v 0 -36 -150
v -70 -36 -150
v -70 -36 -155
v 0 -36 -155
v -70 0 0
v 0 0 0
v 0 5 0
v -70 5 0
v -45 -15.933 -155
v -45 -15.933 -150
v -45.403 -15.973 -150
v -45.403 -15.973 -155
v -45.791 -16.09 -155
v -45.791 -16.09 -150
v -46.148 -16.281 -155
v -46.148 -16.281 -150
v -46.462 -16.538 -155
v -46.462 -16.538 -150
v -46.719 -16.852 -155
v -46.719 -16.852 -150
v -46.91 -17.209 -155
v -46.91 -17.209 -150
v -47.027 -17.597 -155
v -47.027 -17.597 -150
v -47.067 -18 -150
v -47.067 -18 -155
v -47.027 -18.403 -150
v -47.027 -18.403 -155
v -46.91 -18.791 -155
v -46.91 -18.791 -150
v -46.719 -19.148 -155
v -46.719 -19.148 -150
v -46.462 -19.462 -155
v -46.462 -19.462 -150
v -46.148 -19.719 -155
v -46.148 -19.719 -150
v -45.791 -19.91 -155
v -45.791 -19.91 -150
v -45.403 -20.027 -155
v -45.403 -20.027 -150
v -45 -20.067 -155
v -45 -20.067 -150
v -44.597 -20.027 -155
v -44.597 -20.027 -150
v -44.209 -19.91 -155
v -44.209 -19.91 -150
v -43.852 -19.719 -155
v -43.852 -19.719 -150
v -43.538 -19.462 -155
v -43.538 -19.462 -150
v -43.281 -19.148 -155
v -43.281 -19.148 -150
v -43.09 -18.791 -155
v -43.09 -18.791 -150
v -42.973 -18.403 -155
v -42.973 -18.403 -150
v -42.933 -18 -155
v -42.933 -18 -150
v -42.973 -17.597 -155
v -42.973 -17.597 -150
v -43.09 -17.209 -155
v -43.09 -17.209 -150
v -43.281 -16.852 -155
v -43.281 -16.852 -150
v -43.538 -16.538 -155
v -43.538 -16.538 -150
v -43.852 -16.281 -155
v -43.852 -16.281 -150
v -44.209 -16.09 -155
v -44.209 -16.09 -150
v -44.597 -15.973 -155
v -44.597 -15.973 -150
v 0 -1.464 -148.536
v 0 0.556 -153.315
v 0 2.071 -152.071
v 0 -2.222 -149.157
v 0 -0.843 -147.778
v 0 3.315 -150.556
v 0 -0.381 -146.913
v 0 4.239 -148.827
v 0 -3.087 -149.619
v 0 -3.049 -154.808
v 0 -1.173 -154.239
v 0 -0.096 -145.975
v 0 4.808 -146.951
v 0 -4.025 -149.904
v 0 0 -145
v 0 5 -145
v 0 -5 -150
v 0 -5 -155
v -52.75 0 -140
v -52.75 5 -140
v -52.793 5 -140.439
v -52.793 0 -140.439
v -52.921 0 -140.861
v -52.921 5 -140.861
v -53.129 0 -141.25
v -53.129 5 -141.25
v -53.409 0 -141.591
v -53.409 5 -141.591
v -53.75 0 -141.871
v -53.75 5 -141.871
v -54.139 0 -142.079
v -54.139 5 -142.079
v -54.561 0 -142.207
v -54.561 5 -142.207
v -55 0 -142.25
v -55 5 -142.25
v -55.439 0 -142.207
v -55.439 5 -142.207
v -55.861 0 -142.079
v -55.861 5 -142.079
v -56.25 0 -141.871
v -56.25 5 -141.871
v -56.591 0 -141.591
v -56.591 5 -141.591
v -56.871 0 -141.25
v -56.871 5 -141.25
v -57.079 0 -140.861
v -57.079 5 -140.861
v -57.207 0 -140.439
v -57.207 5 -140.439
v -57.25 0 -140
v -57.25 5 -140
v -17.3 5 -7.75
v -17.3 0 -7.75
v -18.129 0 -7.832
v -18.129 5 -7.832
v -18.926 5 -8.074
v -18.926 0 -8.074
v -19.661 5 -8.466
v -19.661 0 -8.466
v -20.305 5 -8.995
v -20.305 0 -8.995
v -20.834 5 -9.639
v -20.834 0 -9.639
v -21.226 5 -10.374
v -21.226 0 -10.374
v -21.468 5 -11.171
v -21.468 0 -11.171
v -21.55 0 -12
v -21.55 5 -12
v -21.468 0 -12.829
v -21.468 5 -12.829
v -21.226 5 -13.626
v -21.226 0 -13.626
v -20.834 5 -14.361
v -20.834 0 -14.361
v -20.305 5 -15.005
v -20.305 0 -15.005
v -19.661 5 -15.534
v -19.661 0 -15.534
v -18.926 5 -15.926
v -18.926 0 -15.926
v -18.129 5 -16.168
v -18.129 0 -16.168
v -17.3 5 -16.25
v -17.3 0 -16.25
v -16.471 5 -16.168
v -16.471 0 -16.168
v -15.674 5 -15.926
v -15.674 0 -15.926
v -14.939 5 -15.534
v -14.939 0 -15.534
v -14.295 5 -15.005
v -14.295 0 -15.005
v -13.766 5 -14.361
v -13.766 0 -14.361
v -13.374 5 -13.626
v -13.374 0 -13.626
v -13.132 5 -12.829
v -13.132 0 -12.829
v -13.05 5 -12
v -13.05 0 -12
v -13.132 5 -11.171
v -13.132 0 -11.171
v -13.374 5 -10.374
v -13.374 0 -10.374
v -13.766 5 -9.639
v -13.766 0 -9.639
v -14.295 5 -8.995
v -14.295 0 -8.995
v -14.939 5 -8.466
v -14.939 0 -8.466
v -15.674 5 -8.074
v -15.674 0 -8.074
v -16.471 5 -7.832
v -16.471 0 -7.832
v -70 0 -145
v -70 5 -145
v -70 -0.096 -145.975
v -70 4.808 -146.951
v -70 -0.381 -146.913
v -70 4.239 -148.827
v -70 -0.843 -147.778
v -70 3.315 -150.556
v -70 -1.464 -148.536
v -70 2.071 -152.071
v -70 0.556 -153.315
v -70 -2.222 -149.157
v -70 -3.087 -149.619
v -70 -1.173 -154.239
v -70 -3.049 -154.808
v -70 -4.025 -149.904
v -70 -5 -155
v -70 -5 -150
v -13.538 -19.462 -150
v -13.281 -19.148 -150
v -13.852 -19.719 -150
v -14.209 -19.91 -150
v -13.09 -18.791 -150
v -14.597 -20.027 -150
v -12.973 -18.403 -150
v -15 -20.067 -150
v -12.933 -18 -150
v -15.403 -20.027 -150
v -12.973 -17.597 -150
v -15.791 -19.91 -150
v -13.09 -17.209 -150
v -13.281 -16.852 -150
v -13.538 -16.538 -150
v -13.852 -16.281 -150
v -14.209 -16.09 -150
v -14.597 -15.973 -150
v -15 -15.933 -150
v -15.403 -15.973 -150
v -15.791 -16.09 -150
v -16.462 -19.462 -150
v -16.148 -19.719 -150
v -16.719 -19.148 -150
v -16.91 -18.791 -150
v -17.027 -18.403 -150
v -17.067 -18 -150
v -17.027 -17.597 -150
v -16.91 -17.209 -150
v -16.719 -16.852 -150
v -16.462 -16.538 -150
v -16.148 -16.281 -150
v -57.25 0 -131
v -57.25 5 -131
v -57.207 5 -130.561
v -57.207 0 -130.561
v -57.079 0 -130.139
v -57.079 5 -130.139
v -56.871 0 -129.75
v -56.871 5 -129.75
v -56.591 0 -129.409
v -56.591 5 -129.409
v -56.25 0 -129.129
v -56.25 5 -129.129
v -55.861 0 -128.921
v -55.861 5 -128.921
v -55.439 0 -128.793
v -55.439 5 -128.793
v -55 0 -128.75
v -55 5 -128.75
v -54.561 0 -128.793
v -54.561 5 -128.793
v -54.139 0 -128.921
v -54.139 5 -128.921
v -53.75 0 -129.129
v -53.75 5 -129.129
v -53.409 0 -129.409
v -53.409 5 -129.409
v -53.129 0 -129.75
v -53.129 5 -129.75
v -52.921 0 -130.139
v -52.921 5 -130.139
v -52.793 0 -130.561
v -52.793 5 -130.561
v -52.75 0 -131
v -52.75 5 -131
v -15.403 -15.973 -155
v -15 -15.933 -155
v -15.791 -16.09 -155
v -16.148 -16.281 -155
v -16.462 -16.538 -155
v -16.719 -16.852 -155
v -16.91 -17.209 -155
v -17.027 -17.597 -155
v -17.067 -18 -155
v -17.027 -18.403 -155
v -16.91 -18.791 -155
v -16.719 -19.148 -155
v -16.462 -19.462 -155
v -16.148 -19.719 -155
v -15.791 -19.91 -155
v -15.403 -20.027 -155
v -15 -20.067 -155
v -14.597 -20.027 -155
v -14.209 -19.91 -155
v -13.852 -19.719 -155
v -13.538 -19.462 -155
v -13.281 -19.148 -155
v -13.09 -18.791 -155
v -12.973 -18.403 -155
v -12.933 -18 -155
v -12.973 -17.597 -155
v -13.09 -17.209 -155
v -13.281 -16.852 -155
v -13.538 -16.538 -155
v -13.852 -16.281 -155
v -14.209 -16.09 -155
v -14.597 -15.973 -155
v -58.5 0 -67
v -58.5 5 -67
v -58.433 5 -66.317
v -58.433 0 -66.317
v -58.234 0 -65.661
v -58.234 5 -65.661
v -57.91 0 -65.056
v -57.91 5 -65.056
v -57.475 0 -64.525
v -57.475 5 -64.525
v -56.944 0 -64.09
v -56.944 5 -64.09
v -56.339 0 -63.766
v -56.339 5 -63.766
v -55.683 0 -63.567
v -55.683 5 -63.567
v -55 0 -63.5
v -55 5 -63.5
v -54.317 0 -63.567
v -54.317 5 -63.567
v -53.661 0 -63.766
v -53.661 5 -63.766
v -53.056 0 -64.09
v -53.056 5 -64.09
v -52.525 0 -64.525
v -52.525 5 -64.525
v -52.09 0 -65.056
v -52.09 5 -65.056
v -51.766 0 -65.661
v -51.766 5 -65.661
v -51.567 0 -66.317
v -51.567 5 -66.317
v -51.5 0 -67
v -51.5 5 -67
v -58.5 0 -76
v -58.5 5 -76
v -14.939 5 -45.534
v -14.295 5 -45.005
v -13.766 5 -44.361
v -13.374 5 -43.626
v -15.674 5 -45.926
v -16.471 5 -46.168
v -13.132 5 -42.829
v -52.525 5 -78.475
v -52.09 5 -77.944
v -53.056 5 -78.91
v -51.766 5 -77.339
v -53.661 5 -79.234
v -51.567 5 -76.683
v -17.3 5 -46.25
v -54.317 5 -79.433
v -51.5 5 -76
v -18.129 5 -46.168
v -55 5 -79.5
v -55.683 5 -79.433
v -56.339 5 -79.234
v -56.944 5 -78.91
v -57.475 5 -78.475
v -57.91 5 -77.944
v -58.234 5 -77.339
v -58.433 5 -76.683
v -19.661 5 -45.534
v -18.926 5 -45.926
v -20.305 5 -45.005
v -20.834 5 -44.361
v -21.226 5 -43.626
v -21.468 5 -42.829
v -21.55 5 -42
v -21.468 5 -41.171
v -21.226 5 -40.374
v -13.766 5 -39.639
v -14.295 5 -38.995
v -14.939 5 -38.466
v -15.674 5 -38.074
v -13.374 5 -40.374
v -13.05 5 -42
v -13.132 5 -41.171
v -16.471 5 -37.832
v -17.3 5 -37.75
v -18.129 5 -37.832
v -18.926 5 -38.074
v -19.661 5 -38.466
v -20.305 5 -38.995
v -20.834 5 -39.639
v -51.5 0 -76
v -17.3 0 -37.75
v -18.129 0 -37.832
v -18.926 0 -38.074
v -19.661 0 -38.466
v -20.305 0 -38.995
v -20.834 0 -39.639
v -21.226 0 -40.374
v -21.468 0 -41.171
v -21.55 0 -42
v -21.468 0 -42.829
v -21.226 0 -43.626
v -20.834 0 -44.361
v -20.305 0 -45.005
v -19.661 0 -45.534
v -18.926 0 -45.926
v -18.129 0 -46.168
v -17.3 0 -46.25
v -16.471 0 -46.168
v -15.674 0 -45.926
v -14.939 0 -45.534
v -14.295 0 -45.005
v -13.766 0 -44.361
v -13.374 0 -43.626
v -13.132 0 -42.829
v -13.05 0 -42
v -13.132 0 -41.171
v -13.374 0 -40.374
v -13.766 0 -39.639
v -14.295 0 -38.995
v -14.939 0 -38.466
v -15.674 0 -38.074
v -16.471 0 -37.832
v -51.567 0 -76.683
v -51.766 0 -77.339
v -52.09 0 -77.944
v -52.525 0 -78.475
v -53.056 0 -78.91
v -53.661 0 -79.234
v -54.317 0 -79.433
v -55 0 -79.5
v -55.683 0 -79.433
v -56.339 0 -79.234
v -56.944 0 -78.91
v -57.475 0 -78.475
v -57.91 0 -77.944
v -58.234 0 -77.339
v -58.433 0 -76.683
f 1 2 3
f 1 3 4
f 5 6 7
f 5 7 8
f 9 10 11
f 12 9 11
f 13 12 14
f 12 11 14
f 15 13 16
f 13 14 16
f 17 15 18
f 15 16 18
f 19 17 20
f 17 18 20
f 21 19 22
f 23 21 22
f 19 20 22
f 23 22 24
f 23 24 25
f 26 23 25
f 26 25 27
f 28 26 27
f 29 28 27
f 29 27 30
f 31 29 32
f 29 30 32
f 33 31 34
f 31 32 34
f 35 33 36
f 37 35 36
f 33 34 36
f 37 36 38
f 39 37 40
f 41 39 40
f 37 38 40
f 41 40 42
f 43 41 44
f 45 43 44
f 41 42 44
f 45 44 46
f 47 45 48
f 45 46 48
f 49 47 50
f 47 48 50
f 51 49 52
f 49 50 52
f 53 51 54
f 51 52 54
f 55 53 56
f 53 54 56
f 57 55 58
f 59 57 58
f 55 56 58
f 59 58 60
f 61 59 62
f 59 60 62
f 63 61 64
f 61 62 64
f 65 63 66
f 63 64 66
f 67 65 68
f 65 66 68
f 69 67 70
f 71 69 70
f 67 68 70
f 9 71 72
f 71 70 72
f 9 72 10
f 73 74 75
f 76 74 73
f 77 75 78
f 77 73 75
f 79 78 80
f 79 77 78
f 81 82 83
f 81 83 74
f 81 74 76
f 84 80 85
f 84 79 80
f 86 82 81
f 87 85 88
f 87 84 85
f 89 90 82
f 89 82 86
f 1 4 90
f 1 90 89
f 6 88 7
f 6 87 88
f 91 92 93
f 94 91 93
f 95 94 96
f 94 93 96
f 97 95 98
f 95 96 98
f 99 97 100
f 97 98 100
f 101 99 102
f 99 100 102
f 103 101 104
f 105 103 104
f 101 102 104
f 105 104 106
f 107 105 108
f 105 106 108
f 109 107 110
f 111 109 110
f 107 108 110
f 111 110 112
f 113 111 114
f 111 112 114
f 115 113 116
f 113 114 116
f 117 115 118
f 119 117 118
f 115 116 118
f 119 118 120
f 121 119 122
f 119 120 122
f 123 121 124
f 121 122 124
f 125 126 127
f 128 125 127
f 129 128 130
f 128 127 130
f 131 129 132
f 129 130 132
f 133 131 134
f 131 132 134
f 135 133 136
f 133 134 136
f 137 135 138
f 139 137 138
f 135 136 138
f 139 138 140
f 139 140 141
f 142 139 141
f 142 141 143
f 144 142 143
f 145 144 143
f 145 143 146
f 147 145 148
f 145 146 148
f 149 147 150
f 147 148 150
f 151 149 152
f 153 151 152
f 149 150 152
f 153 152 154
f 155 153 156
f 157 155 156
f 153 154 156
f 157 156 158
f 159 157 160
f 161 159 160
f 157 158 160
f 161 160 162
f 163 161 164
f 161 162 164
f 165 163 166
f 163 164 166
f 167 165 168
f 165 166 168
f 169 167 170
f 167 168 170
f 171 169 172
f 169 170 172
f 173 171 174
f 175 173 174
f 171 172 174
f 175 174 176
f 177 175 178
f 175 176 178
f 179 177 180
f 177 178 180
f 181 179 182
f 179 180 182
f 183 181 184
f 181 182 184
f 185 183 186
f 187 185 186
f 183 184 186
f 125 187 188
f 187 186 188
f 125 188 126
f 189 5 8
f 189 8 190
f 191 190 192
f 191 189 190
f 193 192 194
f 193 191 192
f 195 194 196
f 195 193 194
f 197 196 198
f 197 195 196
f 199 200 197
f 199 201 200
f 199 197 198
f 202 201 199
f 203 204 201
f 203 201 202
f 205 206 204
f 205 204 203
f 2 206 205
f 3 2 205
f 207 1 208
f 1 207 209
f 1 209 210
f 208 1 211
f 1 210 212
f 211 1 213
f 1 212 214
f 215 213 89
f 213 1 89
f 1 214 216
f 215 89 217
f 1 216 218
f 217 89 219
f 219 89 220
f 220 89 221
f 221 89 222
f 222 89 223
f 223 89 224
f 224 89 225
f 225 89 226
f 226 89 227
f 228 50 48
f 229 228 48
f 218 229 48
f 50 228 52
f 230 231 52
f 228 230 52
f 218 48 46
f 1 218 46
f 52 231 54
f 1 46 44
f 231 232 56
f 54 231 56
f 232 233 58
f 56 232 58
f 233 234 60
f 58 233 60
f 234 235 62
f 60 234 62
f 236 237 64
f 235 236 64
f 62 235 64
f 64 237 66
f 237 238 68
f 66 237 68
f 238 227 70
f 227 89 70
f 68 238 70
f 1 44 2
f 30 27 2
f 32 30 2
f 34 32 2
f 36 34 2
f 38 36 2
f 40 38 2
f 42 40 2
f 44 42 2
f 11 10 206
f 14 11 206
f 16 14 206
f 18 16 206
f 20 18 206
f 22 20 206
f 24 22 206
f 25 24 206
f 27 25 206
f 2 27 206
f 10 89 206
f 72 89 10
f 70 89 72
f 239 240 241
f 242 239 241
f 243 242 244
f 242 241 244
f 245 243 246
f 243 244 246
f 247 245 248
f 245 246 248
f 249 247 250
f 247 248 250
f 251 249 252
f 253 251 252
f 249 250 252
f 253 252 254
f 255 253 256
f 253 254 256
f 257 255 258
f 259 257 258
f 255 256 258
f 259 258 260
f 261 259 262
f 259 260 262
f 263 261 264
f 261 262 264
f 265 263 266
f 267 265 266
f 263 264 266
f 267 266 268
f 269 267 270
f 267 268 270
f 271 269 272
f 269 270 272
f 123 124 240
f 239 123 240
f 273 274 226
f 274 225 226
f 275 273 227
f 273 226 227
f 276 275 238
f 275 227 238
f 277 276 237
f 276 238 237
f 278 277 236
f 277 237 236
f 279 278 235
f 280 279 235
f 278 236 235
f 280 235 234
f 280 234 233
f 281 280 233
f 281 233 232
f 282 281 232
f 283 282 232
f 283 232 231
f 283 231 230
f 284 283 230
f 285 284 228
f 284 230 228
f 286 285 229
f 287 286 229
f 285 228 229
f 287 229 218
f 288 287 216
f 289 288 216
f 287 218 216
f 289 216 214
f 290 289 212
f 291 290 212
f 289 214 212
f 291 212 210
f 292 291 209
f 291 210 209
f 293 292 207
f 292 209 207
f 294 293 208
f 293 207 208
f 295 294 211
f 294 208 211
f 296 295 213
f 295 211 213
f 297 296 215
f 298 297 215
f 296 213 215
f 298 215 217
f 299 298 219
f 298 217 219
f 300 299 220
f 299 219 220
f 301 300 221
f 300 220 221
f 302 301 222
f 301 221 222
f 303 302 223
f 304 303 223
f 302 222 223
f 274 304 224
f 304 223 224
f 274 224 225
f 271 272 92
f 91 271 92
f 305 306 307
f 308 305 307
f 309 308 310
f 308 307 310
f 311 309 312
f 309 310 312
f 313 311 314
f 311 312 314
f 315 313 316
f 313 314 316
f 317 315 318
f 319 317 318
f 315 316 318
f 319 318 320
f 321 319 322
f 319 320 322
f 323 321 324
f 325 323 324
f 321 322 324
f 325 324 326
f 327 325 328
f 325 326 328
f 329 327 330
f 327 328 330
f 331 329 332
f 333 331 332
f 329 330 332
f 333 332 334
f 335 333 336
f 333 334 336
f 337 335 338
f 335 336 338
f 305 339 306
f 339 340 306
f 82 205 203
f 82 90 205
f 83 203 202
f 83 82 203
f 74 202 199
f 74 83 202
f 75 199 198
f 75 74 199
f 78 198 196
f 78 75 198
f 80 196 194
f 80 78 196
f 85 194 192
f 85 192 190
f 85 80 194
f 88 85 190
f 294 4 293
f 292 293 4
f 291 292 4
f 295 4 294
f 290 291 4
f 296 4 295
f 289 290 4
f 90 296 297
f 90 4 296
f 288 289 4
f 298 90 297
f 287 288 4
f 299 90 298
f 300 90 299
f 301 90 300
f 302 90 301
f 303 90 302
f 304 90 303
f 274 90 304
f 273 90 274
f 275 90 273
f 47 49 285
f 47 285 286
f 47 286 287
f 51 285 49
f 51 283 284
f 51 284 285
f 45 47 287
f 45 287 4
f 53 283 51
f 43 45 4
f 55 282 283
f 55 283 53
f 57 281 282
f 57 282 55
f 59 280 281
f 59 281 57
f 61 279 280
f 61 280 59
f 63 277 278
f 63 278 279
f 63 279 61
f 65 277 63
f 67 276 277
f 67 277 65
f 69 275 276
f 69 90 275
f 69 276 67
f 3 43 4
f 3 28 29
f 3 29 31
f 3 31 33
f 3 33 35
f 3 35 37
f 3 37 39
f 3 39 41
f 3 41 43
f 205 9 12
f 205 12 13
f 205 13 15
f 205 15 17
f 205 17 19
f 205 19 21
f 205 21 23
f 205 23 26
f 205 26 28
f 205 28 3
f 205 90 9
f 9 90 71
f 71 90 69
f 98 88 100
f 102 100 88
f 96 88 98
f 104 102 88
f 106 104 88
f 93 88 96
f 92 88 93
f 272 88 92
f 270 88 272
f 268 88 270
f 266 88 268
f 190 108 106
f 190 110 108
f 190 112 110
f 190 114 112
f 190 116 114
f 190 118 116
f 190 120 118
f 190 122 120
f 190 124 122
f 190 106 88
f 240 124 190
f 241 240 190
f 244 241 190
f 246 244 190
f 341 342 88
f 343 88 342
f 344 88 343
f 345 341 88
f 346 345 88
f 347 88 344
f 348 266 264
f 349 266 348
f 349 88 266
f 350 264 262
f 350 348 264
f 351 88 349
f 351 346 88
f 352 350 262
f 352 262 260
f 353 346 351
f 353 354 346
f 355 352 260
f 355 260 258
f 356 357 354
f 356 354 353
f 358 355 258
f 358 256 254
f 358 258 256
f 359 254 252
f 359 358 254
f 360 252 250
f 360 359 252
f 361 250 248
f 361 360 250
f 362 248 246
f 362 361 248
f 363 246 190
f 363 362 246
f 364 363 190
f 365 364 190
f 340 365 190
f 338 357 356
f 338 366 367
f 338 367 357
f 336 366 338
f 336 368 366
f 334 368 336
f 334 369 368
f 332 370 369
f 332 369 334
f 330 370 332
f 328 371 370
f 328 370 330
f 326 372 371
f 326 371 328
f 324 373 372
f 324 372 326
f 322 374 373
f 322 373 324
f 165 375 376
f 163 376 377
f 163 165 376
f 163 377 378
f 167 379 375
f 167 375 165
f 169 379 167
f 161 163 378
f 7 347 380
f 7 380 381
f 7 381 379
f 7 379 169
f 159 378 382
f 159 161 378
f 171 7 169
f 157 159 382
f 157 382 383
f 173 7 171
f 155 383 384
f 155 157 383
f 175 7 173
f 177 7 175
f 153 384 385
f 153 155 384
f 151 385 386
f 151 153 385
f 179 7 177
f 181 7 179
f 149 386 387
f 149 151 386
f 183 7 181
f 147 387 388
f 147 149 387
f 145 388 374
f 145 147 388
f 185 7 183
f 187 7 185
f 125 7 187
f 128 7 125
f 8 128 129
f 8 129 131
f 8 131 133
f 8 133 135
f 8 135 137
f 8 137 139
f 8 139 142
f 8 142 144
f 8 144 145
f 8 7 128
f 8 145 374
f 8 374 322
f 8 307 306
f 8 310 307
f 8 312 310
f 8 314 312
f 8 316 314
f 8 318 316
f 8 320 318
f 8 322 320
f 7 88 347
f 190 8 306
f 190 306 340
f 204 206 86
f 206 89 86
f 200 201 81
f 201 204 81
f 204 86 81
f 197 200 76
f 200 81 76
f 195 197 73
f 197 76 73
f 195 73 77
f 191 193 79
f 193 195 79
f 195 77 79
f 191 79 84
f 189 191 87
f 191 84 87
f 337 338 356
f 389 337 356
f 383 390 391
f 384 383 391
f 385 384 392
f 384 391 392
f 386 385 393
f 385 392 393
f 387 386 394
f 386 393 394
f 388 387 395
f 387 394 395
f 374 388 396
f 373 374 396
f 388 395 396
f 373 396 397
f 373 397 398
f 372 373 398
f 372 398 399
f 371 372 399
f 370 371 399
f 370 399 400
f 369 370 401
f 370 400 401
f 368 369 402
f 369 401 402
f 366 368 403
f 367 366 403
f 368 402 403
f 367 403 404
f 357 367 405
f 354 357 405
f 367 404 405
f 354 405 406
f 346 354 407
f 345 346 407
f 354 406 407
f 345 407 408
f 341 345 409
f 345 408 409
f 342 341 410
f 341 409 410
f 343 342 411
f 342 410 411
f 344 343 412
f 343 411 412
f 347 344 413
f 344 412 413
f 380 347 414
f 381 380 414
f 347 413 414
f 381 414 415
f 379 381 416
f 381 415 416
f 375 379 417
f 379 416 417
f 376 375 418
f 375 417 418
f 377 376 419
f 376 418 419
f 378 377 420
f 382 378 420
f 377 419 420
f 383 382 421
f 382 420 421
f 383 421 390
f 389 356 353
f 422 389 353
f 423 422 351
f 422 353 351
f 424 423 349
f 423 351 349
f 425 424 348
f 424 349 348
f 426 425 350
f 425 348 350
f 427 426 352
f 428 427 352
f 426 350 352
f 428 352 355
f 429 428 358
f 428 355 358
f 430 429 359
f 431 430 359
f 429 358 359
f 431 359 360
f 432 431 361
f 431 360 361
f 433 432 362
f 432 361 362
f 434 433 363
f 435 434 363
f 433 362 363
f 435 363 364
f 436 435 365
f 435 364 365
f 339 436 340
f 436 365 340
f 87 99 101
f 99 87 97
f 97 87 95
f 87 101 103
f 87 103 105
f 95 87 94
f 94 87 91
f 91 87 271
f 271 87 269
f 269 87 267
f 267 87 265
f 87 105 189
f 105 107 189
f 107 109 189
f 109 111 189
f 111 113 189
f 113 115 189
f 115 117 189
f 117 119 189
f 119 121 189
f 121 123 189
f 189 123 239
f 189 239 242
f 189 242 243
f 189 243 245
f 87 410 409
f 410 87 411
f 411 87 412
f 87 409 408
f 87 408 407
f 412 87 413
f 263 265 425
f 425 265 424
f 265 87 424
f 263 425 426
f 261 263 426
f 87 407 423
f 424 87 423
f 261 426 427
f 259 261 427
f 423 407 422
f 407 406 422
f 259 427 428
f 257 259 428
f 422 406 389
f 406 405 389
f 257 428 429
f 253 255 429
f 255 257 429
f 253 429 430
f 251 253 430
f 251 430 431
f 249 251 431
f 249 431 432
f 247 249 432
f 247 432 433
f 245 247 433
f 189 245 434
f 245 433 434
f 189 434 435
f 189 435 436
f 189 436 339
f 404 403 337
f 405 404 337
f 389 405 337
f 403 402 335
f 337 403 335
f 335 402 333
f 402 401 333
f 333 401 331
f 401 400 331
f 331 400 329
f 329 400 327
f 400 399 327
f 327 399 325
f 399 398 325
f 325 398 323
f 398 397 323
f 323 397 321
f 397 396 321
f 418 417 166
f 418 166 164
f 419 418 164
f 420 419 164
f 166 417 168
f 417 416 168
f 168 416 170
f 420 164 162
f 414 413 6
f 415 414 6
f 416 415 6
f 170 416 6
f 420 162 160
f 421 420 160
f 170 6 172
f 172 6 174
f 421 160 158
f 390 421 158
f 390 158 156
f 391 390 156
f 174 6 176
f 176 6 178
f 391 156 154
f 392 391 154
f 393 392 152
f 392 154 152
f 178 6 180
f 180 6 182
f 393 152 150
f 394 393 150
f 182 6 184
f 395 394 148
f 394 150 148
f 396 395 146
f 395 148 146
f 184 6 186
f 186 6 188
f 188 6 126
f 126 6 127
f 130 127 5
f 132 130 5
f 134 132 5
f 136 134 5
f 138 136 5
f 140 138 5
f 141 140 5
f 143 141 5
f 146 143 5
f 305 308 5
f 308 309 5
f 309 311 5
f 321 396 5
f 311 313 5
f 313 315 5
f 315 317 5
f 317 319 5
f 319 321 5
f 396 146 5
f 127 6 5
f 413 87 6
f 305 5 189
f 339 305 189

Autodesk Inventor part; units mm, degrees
ref_plane "YZ Plane" through (0, 0, 0) normal (1, 0, 0) x (0, 1, 0)
ref_plane "XZ Plane" through (0, 0, 0) normal (0, 1, 0) x (-1, 0, 0)
ref_plane "XY Plane" through (0, 0, 0) normal (0, 0, 1) x (1, 0, 0)
sketch "Sketch1" plane through (0, 0, 0) normal (0, 1, 0) x (-1, 0, 0)
  line L0 (0, 0) -> (70, 0)
  line L1 (70, 0) -> (70, -150)
  line L2 (70, -150) -> (0, -150)
  line L3 (0, -150) -> (0, 0)
  dimension "d0" = 70
  dimension "d1" = 150
extrude "Plate1" add sketch "Sketch1" along normal blind 5
sketch "Sketch2" plane through (0, 0, -150) normal (0, 0, -1) x (-1, 0, 0)
  line L0 (70, 5) -> (0, 5)
  line L1 (0, 5) -> (70, 5)
  line L2 (70, 5) -> (70, -36)
  line L3 (70, -36) -> (0, -36)
  line L4 (0, -36) -> (0, 5)
  point P0 (0, 0)
  dimension "d3" = 70
  dimension "d4" = 41
sheet face with bend "Face2" sketch "Sketch2" thickness 5 toward (0, 0, -1) bend radius 5
bend "Bend1"
sketch "Sketch3" plane through (0, 0, -155) normal (0, 0, -1) x (-1, 0, 0)
  line L0 (70, -36) -> (0, -36) projected
  line L1 (70, -5) -> (70, -36) projected
  point P0 (0, 0)
  point P1 (45, -18)
  point P2 (15, -18)
  dimension "d10" = 18
  dimension "d11" = 18
  dimension "d19" = 25
  dimension "d20" = 30
hole "Hole1" at (-45, -18, -155) at (-15, -18, -155) direction (0, 0, 1) diameter 4.134 depth 5 thread size "M5x0.8" class "6H" standard "ISO Metric profile"
sketch "Sketch4" plane through (0, 5, 0) normal (0, 1, 0) x (1, 0, 0)
  line L0 (-70, 145) -> (0, 145) projected
  line L1 (-55, 145) -> (-55, 0) construction
  line L2 (-70, 0) -> (0, 0) projected
  line L3 (-70, 0) -> (-70, 145) projected
  line L4 (-57.25, 131) -> (-52.75, 131)
  line L5 (-52.75, 131) -> (-52.75, 140)
  line L6 (-52.75, 140) -> (-57.25, 140)
  line L7 (-57.25, 140) -> (-57.25, 131)
  line L8 (-57.25, 131) -> (-52.75, 140) construction
  line L9 (-52.75, 131) -> (-57.25, 140) construction
  arc A0 (-52.75, 140) -> (-57.25, 140) centre (-55, 140) ccw
  arc A1 (-57.25, 131) -> (-52.75, 131) centre (-55, 131) ccw
  line L10 (-55, 140) -> (-51.5, 76.0958) construction
  line L11 (-55, 140) -> (9, 140) construction
  line L12 (-55, 131) -> (-51.5, 67.0958) construction
  line L13 (-55, 131) -> (9, 131) construction
  line L14 (-58.5, 67) -> (-51.5, 67)
  line L15 (-51.5, 67) -> (-51.5, 76)
  line L16 (-51.5, 76) -> (-58.5, 76)
  line L17 (-58.5, 76) -> (-58.5, 67)
  line L18 (-58.5, 67) -> (-51.5, 76) construction
  line L19 (-51.5, 67) -> (-58.5, 76) construction
  arc A2 (-51.5, 76) -> (-58.5, 76) centre (-55, 76) ccw
  arc A3 (-58.5, 67) -> (-51.5, 67) centre (-55, 67) ccw
  point P0 (-70, 72.5)
  point P1 (-55, 135.5)
  point P2 (-55, 71.5)
  dimension "d21" = 15
  dimension "d22" = 4.5
  dimension "d23" = 9
  dimension "d25" = 5
  dimension "d32" = 64
  dimension "d34" = 64
  dimension "d36" = 7
  dimension "d37" = 9
  dimension "d40" = 64
extrude "Extrusion1" cut sketch "Sketch4" against normal up to surface (5 mm away)
sketch "Sketch5" plane through (0, 5, 0) normal (0, 1, 0) x (1, 0, 0)
  line L0 (-70, 0) -> (-70, 145) projected
  line L1 (0, 0) -> (-70, 0) projected
  point P0 (-17.3, 42)
  point P1 (-17.3, 12)
  dimension "d41" = 52.7
  dimension "d42" = 52.7
  dimension "d50" = 30
  dimension "d51" = 12
hole "Hole2" at (-17.3, 5, -12) at (-17.3, 5, -42) direction (0, -1, 0) diameter 8.5 end through all
equation "\"d11\" = d10"
equation "\"d17\" = Thickness"
equation "\"d37\" = d23"
equation "\"d2\" = Thickness"
equation "\"d5\" = BendRadius"
equation "\"d6\" = BendReliefWidth"
equation "\"d8\" = MinimumRemnant"
equation "\"d7\" = BendReliefDepth"
equation "\"d9\" = TransitionRadius"
equation "\"d42\" = d41"
equation "\"BendRadius\" = Thickness"
equation "\"BendReliefWidth\" = Thickness"
equation "\"BendReliefDepth\" = 0.5 * Thickness"
equation "\"TransitionRadius\" = BendRadius"
equation "\"JacobiRadiusSize\" = BendRadius"
equation "\"GapSize\" = Thickness"
equation "\"Thickness\" = 5"
equation "\"MinimumRemnant\" = 10"
properties part number "ER_Halterung_Kantensensor"
